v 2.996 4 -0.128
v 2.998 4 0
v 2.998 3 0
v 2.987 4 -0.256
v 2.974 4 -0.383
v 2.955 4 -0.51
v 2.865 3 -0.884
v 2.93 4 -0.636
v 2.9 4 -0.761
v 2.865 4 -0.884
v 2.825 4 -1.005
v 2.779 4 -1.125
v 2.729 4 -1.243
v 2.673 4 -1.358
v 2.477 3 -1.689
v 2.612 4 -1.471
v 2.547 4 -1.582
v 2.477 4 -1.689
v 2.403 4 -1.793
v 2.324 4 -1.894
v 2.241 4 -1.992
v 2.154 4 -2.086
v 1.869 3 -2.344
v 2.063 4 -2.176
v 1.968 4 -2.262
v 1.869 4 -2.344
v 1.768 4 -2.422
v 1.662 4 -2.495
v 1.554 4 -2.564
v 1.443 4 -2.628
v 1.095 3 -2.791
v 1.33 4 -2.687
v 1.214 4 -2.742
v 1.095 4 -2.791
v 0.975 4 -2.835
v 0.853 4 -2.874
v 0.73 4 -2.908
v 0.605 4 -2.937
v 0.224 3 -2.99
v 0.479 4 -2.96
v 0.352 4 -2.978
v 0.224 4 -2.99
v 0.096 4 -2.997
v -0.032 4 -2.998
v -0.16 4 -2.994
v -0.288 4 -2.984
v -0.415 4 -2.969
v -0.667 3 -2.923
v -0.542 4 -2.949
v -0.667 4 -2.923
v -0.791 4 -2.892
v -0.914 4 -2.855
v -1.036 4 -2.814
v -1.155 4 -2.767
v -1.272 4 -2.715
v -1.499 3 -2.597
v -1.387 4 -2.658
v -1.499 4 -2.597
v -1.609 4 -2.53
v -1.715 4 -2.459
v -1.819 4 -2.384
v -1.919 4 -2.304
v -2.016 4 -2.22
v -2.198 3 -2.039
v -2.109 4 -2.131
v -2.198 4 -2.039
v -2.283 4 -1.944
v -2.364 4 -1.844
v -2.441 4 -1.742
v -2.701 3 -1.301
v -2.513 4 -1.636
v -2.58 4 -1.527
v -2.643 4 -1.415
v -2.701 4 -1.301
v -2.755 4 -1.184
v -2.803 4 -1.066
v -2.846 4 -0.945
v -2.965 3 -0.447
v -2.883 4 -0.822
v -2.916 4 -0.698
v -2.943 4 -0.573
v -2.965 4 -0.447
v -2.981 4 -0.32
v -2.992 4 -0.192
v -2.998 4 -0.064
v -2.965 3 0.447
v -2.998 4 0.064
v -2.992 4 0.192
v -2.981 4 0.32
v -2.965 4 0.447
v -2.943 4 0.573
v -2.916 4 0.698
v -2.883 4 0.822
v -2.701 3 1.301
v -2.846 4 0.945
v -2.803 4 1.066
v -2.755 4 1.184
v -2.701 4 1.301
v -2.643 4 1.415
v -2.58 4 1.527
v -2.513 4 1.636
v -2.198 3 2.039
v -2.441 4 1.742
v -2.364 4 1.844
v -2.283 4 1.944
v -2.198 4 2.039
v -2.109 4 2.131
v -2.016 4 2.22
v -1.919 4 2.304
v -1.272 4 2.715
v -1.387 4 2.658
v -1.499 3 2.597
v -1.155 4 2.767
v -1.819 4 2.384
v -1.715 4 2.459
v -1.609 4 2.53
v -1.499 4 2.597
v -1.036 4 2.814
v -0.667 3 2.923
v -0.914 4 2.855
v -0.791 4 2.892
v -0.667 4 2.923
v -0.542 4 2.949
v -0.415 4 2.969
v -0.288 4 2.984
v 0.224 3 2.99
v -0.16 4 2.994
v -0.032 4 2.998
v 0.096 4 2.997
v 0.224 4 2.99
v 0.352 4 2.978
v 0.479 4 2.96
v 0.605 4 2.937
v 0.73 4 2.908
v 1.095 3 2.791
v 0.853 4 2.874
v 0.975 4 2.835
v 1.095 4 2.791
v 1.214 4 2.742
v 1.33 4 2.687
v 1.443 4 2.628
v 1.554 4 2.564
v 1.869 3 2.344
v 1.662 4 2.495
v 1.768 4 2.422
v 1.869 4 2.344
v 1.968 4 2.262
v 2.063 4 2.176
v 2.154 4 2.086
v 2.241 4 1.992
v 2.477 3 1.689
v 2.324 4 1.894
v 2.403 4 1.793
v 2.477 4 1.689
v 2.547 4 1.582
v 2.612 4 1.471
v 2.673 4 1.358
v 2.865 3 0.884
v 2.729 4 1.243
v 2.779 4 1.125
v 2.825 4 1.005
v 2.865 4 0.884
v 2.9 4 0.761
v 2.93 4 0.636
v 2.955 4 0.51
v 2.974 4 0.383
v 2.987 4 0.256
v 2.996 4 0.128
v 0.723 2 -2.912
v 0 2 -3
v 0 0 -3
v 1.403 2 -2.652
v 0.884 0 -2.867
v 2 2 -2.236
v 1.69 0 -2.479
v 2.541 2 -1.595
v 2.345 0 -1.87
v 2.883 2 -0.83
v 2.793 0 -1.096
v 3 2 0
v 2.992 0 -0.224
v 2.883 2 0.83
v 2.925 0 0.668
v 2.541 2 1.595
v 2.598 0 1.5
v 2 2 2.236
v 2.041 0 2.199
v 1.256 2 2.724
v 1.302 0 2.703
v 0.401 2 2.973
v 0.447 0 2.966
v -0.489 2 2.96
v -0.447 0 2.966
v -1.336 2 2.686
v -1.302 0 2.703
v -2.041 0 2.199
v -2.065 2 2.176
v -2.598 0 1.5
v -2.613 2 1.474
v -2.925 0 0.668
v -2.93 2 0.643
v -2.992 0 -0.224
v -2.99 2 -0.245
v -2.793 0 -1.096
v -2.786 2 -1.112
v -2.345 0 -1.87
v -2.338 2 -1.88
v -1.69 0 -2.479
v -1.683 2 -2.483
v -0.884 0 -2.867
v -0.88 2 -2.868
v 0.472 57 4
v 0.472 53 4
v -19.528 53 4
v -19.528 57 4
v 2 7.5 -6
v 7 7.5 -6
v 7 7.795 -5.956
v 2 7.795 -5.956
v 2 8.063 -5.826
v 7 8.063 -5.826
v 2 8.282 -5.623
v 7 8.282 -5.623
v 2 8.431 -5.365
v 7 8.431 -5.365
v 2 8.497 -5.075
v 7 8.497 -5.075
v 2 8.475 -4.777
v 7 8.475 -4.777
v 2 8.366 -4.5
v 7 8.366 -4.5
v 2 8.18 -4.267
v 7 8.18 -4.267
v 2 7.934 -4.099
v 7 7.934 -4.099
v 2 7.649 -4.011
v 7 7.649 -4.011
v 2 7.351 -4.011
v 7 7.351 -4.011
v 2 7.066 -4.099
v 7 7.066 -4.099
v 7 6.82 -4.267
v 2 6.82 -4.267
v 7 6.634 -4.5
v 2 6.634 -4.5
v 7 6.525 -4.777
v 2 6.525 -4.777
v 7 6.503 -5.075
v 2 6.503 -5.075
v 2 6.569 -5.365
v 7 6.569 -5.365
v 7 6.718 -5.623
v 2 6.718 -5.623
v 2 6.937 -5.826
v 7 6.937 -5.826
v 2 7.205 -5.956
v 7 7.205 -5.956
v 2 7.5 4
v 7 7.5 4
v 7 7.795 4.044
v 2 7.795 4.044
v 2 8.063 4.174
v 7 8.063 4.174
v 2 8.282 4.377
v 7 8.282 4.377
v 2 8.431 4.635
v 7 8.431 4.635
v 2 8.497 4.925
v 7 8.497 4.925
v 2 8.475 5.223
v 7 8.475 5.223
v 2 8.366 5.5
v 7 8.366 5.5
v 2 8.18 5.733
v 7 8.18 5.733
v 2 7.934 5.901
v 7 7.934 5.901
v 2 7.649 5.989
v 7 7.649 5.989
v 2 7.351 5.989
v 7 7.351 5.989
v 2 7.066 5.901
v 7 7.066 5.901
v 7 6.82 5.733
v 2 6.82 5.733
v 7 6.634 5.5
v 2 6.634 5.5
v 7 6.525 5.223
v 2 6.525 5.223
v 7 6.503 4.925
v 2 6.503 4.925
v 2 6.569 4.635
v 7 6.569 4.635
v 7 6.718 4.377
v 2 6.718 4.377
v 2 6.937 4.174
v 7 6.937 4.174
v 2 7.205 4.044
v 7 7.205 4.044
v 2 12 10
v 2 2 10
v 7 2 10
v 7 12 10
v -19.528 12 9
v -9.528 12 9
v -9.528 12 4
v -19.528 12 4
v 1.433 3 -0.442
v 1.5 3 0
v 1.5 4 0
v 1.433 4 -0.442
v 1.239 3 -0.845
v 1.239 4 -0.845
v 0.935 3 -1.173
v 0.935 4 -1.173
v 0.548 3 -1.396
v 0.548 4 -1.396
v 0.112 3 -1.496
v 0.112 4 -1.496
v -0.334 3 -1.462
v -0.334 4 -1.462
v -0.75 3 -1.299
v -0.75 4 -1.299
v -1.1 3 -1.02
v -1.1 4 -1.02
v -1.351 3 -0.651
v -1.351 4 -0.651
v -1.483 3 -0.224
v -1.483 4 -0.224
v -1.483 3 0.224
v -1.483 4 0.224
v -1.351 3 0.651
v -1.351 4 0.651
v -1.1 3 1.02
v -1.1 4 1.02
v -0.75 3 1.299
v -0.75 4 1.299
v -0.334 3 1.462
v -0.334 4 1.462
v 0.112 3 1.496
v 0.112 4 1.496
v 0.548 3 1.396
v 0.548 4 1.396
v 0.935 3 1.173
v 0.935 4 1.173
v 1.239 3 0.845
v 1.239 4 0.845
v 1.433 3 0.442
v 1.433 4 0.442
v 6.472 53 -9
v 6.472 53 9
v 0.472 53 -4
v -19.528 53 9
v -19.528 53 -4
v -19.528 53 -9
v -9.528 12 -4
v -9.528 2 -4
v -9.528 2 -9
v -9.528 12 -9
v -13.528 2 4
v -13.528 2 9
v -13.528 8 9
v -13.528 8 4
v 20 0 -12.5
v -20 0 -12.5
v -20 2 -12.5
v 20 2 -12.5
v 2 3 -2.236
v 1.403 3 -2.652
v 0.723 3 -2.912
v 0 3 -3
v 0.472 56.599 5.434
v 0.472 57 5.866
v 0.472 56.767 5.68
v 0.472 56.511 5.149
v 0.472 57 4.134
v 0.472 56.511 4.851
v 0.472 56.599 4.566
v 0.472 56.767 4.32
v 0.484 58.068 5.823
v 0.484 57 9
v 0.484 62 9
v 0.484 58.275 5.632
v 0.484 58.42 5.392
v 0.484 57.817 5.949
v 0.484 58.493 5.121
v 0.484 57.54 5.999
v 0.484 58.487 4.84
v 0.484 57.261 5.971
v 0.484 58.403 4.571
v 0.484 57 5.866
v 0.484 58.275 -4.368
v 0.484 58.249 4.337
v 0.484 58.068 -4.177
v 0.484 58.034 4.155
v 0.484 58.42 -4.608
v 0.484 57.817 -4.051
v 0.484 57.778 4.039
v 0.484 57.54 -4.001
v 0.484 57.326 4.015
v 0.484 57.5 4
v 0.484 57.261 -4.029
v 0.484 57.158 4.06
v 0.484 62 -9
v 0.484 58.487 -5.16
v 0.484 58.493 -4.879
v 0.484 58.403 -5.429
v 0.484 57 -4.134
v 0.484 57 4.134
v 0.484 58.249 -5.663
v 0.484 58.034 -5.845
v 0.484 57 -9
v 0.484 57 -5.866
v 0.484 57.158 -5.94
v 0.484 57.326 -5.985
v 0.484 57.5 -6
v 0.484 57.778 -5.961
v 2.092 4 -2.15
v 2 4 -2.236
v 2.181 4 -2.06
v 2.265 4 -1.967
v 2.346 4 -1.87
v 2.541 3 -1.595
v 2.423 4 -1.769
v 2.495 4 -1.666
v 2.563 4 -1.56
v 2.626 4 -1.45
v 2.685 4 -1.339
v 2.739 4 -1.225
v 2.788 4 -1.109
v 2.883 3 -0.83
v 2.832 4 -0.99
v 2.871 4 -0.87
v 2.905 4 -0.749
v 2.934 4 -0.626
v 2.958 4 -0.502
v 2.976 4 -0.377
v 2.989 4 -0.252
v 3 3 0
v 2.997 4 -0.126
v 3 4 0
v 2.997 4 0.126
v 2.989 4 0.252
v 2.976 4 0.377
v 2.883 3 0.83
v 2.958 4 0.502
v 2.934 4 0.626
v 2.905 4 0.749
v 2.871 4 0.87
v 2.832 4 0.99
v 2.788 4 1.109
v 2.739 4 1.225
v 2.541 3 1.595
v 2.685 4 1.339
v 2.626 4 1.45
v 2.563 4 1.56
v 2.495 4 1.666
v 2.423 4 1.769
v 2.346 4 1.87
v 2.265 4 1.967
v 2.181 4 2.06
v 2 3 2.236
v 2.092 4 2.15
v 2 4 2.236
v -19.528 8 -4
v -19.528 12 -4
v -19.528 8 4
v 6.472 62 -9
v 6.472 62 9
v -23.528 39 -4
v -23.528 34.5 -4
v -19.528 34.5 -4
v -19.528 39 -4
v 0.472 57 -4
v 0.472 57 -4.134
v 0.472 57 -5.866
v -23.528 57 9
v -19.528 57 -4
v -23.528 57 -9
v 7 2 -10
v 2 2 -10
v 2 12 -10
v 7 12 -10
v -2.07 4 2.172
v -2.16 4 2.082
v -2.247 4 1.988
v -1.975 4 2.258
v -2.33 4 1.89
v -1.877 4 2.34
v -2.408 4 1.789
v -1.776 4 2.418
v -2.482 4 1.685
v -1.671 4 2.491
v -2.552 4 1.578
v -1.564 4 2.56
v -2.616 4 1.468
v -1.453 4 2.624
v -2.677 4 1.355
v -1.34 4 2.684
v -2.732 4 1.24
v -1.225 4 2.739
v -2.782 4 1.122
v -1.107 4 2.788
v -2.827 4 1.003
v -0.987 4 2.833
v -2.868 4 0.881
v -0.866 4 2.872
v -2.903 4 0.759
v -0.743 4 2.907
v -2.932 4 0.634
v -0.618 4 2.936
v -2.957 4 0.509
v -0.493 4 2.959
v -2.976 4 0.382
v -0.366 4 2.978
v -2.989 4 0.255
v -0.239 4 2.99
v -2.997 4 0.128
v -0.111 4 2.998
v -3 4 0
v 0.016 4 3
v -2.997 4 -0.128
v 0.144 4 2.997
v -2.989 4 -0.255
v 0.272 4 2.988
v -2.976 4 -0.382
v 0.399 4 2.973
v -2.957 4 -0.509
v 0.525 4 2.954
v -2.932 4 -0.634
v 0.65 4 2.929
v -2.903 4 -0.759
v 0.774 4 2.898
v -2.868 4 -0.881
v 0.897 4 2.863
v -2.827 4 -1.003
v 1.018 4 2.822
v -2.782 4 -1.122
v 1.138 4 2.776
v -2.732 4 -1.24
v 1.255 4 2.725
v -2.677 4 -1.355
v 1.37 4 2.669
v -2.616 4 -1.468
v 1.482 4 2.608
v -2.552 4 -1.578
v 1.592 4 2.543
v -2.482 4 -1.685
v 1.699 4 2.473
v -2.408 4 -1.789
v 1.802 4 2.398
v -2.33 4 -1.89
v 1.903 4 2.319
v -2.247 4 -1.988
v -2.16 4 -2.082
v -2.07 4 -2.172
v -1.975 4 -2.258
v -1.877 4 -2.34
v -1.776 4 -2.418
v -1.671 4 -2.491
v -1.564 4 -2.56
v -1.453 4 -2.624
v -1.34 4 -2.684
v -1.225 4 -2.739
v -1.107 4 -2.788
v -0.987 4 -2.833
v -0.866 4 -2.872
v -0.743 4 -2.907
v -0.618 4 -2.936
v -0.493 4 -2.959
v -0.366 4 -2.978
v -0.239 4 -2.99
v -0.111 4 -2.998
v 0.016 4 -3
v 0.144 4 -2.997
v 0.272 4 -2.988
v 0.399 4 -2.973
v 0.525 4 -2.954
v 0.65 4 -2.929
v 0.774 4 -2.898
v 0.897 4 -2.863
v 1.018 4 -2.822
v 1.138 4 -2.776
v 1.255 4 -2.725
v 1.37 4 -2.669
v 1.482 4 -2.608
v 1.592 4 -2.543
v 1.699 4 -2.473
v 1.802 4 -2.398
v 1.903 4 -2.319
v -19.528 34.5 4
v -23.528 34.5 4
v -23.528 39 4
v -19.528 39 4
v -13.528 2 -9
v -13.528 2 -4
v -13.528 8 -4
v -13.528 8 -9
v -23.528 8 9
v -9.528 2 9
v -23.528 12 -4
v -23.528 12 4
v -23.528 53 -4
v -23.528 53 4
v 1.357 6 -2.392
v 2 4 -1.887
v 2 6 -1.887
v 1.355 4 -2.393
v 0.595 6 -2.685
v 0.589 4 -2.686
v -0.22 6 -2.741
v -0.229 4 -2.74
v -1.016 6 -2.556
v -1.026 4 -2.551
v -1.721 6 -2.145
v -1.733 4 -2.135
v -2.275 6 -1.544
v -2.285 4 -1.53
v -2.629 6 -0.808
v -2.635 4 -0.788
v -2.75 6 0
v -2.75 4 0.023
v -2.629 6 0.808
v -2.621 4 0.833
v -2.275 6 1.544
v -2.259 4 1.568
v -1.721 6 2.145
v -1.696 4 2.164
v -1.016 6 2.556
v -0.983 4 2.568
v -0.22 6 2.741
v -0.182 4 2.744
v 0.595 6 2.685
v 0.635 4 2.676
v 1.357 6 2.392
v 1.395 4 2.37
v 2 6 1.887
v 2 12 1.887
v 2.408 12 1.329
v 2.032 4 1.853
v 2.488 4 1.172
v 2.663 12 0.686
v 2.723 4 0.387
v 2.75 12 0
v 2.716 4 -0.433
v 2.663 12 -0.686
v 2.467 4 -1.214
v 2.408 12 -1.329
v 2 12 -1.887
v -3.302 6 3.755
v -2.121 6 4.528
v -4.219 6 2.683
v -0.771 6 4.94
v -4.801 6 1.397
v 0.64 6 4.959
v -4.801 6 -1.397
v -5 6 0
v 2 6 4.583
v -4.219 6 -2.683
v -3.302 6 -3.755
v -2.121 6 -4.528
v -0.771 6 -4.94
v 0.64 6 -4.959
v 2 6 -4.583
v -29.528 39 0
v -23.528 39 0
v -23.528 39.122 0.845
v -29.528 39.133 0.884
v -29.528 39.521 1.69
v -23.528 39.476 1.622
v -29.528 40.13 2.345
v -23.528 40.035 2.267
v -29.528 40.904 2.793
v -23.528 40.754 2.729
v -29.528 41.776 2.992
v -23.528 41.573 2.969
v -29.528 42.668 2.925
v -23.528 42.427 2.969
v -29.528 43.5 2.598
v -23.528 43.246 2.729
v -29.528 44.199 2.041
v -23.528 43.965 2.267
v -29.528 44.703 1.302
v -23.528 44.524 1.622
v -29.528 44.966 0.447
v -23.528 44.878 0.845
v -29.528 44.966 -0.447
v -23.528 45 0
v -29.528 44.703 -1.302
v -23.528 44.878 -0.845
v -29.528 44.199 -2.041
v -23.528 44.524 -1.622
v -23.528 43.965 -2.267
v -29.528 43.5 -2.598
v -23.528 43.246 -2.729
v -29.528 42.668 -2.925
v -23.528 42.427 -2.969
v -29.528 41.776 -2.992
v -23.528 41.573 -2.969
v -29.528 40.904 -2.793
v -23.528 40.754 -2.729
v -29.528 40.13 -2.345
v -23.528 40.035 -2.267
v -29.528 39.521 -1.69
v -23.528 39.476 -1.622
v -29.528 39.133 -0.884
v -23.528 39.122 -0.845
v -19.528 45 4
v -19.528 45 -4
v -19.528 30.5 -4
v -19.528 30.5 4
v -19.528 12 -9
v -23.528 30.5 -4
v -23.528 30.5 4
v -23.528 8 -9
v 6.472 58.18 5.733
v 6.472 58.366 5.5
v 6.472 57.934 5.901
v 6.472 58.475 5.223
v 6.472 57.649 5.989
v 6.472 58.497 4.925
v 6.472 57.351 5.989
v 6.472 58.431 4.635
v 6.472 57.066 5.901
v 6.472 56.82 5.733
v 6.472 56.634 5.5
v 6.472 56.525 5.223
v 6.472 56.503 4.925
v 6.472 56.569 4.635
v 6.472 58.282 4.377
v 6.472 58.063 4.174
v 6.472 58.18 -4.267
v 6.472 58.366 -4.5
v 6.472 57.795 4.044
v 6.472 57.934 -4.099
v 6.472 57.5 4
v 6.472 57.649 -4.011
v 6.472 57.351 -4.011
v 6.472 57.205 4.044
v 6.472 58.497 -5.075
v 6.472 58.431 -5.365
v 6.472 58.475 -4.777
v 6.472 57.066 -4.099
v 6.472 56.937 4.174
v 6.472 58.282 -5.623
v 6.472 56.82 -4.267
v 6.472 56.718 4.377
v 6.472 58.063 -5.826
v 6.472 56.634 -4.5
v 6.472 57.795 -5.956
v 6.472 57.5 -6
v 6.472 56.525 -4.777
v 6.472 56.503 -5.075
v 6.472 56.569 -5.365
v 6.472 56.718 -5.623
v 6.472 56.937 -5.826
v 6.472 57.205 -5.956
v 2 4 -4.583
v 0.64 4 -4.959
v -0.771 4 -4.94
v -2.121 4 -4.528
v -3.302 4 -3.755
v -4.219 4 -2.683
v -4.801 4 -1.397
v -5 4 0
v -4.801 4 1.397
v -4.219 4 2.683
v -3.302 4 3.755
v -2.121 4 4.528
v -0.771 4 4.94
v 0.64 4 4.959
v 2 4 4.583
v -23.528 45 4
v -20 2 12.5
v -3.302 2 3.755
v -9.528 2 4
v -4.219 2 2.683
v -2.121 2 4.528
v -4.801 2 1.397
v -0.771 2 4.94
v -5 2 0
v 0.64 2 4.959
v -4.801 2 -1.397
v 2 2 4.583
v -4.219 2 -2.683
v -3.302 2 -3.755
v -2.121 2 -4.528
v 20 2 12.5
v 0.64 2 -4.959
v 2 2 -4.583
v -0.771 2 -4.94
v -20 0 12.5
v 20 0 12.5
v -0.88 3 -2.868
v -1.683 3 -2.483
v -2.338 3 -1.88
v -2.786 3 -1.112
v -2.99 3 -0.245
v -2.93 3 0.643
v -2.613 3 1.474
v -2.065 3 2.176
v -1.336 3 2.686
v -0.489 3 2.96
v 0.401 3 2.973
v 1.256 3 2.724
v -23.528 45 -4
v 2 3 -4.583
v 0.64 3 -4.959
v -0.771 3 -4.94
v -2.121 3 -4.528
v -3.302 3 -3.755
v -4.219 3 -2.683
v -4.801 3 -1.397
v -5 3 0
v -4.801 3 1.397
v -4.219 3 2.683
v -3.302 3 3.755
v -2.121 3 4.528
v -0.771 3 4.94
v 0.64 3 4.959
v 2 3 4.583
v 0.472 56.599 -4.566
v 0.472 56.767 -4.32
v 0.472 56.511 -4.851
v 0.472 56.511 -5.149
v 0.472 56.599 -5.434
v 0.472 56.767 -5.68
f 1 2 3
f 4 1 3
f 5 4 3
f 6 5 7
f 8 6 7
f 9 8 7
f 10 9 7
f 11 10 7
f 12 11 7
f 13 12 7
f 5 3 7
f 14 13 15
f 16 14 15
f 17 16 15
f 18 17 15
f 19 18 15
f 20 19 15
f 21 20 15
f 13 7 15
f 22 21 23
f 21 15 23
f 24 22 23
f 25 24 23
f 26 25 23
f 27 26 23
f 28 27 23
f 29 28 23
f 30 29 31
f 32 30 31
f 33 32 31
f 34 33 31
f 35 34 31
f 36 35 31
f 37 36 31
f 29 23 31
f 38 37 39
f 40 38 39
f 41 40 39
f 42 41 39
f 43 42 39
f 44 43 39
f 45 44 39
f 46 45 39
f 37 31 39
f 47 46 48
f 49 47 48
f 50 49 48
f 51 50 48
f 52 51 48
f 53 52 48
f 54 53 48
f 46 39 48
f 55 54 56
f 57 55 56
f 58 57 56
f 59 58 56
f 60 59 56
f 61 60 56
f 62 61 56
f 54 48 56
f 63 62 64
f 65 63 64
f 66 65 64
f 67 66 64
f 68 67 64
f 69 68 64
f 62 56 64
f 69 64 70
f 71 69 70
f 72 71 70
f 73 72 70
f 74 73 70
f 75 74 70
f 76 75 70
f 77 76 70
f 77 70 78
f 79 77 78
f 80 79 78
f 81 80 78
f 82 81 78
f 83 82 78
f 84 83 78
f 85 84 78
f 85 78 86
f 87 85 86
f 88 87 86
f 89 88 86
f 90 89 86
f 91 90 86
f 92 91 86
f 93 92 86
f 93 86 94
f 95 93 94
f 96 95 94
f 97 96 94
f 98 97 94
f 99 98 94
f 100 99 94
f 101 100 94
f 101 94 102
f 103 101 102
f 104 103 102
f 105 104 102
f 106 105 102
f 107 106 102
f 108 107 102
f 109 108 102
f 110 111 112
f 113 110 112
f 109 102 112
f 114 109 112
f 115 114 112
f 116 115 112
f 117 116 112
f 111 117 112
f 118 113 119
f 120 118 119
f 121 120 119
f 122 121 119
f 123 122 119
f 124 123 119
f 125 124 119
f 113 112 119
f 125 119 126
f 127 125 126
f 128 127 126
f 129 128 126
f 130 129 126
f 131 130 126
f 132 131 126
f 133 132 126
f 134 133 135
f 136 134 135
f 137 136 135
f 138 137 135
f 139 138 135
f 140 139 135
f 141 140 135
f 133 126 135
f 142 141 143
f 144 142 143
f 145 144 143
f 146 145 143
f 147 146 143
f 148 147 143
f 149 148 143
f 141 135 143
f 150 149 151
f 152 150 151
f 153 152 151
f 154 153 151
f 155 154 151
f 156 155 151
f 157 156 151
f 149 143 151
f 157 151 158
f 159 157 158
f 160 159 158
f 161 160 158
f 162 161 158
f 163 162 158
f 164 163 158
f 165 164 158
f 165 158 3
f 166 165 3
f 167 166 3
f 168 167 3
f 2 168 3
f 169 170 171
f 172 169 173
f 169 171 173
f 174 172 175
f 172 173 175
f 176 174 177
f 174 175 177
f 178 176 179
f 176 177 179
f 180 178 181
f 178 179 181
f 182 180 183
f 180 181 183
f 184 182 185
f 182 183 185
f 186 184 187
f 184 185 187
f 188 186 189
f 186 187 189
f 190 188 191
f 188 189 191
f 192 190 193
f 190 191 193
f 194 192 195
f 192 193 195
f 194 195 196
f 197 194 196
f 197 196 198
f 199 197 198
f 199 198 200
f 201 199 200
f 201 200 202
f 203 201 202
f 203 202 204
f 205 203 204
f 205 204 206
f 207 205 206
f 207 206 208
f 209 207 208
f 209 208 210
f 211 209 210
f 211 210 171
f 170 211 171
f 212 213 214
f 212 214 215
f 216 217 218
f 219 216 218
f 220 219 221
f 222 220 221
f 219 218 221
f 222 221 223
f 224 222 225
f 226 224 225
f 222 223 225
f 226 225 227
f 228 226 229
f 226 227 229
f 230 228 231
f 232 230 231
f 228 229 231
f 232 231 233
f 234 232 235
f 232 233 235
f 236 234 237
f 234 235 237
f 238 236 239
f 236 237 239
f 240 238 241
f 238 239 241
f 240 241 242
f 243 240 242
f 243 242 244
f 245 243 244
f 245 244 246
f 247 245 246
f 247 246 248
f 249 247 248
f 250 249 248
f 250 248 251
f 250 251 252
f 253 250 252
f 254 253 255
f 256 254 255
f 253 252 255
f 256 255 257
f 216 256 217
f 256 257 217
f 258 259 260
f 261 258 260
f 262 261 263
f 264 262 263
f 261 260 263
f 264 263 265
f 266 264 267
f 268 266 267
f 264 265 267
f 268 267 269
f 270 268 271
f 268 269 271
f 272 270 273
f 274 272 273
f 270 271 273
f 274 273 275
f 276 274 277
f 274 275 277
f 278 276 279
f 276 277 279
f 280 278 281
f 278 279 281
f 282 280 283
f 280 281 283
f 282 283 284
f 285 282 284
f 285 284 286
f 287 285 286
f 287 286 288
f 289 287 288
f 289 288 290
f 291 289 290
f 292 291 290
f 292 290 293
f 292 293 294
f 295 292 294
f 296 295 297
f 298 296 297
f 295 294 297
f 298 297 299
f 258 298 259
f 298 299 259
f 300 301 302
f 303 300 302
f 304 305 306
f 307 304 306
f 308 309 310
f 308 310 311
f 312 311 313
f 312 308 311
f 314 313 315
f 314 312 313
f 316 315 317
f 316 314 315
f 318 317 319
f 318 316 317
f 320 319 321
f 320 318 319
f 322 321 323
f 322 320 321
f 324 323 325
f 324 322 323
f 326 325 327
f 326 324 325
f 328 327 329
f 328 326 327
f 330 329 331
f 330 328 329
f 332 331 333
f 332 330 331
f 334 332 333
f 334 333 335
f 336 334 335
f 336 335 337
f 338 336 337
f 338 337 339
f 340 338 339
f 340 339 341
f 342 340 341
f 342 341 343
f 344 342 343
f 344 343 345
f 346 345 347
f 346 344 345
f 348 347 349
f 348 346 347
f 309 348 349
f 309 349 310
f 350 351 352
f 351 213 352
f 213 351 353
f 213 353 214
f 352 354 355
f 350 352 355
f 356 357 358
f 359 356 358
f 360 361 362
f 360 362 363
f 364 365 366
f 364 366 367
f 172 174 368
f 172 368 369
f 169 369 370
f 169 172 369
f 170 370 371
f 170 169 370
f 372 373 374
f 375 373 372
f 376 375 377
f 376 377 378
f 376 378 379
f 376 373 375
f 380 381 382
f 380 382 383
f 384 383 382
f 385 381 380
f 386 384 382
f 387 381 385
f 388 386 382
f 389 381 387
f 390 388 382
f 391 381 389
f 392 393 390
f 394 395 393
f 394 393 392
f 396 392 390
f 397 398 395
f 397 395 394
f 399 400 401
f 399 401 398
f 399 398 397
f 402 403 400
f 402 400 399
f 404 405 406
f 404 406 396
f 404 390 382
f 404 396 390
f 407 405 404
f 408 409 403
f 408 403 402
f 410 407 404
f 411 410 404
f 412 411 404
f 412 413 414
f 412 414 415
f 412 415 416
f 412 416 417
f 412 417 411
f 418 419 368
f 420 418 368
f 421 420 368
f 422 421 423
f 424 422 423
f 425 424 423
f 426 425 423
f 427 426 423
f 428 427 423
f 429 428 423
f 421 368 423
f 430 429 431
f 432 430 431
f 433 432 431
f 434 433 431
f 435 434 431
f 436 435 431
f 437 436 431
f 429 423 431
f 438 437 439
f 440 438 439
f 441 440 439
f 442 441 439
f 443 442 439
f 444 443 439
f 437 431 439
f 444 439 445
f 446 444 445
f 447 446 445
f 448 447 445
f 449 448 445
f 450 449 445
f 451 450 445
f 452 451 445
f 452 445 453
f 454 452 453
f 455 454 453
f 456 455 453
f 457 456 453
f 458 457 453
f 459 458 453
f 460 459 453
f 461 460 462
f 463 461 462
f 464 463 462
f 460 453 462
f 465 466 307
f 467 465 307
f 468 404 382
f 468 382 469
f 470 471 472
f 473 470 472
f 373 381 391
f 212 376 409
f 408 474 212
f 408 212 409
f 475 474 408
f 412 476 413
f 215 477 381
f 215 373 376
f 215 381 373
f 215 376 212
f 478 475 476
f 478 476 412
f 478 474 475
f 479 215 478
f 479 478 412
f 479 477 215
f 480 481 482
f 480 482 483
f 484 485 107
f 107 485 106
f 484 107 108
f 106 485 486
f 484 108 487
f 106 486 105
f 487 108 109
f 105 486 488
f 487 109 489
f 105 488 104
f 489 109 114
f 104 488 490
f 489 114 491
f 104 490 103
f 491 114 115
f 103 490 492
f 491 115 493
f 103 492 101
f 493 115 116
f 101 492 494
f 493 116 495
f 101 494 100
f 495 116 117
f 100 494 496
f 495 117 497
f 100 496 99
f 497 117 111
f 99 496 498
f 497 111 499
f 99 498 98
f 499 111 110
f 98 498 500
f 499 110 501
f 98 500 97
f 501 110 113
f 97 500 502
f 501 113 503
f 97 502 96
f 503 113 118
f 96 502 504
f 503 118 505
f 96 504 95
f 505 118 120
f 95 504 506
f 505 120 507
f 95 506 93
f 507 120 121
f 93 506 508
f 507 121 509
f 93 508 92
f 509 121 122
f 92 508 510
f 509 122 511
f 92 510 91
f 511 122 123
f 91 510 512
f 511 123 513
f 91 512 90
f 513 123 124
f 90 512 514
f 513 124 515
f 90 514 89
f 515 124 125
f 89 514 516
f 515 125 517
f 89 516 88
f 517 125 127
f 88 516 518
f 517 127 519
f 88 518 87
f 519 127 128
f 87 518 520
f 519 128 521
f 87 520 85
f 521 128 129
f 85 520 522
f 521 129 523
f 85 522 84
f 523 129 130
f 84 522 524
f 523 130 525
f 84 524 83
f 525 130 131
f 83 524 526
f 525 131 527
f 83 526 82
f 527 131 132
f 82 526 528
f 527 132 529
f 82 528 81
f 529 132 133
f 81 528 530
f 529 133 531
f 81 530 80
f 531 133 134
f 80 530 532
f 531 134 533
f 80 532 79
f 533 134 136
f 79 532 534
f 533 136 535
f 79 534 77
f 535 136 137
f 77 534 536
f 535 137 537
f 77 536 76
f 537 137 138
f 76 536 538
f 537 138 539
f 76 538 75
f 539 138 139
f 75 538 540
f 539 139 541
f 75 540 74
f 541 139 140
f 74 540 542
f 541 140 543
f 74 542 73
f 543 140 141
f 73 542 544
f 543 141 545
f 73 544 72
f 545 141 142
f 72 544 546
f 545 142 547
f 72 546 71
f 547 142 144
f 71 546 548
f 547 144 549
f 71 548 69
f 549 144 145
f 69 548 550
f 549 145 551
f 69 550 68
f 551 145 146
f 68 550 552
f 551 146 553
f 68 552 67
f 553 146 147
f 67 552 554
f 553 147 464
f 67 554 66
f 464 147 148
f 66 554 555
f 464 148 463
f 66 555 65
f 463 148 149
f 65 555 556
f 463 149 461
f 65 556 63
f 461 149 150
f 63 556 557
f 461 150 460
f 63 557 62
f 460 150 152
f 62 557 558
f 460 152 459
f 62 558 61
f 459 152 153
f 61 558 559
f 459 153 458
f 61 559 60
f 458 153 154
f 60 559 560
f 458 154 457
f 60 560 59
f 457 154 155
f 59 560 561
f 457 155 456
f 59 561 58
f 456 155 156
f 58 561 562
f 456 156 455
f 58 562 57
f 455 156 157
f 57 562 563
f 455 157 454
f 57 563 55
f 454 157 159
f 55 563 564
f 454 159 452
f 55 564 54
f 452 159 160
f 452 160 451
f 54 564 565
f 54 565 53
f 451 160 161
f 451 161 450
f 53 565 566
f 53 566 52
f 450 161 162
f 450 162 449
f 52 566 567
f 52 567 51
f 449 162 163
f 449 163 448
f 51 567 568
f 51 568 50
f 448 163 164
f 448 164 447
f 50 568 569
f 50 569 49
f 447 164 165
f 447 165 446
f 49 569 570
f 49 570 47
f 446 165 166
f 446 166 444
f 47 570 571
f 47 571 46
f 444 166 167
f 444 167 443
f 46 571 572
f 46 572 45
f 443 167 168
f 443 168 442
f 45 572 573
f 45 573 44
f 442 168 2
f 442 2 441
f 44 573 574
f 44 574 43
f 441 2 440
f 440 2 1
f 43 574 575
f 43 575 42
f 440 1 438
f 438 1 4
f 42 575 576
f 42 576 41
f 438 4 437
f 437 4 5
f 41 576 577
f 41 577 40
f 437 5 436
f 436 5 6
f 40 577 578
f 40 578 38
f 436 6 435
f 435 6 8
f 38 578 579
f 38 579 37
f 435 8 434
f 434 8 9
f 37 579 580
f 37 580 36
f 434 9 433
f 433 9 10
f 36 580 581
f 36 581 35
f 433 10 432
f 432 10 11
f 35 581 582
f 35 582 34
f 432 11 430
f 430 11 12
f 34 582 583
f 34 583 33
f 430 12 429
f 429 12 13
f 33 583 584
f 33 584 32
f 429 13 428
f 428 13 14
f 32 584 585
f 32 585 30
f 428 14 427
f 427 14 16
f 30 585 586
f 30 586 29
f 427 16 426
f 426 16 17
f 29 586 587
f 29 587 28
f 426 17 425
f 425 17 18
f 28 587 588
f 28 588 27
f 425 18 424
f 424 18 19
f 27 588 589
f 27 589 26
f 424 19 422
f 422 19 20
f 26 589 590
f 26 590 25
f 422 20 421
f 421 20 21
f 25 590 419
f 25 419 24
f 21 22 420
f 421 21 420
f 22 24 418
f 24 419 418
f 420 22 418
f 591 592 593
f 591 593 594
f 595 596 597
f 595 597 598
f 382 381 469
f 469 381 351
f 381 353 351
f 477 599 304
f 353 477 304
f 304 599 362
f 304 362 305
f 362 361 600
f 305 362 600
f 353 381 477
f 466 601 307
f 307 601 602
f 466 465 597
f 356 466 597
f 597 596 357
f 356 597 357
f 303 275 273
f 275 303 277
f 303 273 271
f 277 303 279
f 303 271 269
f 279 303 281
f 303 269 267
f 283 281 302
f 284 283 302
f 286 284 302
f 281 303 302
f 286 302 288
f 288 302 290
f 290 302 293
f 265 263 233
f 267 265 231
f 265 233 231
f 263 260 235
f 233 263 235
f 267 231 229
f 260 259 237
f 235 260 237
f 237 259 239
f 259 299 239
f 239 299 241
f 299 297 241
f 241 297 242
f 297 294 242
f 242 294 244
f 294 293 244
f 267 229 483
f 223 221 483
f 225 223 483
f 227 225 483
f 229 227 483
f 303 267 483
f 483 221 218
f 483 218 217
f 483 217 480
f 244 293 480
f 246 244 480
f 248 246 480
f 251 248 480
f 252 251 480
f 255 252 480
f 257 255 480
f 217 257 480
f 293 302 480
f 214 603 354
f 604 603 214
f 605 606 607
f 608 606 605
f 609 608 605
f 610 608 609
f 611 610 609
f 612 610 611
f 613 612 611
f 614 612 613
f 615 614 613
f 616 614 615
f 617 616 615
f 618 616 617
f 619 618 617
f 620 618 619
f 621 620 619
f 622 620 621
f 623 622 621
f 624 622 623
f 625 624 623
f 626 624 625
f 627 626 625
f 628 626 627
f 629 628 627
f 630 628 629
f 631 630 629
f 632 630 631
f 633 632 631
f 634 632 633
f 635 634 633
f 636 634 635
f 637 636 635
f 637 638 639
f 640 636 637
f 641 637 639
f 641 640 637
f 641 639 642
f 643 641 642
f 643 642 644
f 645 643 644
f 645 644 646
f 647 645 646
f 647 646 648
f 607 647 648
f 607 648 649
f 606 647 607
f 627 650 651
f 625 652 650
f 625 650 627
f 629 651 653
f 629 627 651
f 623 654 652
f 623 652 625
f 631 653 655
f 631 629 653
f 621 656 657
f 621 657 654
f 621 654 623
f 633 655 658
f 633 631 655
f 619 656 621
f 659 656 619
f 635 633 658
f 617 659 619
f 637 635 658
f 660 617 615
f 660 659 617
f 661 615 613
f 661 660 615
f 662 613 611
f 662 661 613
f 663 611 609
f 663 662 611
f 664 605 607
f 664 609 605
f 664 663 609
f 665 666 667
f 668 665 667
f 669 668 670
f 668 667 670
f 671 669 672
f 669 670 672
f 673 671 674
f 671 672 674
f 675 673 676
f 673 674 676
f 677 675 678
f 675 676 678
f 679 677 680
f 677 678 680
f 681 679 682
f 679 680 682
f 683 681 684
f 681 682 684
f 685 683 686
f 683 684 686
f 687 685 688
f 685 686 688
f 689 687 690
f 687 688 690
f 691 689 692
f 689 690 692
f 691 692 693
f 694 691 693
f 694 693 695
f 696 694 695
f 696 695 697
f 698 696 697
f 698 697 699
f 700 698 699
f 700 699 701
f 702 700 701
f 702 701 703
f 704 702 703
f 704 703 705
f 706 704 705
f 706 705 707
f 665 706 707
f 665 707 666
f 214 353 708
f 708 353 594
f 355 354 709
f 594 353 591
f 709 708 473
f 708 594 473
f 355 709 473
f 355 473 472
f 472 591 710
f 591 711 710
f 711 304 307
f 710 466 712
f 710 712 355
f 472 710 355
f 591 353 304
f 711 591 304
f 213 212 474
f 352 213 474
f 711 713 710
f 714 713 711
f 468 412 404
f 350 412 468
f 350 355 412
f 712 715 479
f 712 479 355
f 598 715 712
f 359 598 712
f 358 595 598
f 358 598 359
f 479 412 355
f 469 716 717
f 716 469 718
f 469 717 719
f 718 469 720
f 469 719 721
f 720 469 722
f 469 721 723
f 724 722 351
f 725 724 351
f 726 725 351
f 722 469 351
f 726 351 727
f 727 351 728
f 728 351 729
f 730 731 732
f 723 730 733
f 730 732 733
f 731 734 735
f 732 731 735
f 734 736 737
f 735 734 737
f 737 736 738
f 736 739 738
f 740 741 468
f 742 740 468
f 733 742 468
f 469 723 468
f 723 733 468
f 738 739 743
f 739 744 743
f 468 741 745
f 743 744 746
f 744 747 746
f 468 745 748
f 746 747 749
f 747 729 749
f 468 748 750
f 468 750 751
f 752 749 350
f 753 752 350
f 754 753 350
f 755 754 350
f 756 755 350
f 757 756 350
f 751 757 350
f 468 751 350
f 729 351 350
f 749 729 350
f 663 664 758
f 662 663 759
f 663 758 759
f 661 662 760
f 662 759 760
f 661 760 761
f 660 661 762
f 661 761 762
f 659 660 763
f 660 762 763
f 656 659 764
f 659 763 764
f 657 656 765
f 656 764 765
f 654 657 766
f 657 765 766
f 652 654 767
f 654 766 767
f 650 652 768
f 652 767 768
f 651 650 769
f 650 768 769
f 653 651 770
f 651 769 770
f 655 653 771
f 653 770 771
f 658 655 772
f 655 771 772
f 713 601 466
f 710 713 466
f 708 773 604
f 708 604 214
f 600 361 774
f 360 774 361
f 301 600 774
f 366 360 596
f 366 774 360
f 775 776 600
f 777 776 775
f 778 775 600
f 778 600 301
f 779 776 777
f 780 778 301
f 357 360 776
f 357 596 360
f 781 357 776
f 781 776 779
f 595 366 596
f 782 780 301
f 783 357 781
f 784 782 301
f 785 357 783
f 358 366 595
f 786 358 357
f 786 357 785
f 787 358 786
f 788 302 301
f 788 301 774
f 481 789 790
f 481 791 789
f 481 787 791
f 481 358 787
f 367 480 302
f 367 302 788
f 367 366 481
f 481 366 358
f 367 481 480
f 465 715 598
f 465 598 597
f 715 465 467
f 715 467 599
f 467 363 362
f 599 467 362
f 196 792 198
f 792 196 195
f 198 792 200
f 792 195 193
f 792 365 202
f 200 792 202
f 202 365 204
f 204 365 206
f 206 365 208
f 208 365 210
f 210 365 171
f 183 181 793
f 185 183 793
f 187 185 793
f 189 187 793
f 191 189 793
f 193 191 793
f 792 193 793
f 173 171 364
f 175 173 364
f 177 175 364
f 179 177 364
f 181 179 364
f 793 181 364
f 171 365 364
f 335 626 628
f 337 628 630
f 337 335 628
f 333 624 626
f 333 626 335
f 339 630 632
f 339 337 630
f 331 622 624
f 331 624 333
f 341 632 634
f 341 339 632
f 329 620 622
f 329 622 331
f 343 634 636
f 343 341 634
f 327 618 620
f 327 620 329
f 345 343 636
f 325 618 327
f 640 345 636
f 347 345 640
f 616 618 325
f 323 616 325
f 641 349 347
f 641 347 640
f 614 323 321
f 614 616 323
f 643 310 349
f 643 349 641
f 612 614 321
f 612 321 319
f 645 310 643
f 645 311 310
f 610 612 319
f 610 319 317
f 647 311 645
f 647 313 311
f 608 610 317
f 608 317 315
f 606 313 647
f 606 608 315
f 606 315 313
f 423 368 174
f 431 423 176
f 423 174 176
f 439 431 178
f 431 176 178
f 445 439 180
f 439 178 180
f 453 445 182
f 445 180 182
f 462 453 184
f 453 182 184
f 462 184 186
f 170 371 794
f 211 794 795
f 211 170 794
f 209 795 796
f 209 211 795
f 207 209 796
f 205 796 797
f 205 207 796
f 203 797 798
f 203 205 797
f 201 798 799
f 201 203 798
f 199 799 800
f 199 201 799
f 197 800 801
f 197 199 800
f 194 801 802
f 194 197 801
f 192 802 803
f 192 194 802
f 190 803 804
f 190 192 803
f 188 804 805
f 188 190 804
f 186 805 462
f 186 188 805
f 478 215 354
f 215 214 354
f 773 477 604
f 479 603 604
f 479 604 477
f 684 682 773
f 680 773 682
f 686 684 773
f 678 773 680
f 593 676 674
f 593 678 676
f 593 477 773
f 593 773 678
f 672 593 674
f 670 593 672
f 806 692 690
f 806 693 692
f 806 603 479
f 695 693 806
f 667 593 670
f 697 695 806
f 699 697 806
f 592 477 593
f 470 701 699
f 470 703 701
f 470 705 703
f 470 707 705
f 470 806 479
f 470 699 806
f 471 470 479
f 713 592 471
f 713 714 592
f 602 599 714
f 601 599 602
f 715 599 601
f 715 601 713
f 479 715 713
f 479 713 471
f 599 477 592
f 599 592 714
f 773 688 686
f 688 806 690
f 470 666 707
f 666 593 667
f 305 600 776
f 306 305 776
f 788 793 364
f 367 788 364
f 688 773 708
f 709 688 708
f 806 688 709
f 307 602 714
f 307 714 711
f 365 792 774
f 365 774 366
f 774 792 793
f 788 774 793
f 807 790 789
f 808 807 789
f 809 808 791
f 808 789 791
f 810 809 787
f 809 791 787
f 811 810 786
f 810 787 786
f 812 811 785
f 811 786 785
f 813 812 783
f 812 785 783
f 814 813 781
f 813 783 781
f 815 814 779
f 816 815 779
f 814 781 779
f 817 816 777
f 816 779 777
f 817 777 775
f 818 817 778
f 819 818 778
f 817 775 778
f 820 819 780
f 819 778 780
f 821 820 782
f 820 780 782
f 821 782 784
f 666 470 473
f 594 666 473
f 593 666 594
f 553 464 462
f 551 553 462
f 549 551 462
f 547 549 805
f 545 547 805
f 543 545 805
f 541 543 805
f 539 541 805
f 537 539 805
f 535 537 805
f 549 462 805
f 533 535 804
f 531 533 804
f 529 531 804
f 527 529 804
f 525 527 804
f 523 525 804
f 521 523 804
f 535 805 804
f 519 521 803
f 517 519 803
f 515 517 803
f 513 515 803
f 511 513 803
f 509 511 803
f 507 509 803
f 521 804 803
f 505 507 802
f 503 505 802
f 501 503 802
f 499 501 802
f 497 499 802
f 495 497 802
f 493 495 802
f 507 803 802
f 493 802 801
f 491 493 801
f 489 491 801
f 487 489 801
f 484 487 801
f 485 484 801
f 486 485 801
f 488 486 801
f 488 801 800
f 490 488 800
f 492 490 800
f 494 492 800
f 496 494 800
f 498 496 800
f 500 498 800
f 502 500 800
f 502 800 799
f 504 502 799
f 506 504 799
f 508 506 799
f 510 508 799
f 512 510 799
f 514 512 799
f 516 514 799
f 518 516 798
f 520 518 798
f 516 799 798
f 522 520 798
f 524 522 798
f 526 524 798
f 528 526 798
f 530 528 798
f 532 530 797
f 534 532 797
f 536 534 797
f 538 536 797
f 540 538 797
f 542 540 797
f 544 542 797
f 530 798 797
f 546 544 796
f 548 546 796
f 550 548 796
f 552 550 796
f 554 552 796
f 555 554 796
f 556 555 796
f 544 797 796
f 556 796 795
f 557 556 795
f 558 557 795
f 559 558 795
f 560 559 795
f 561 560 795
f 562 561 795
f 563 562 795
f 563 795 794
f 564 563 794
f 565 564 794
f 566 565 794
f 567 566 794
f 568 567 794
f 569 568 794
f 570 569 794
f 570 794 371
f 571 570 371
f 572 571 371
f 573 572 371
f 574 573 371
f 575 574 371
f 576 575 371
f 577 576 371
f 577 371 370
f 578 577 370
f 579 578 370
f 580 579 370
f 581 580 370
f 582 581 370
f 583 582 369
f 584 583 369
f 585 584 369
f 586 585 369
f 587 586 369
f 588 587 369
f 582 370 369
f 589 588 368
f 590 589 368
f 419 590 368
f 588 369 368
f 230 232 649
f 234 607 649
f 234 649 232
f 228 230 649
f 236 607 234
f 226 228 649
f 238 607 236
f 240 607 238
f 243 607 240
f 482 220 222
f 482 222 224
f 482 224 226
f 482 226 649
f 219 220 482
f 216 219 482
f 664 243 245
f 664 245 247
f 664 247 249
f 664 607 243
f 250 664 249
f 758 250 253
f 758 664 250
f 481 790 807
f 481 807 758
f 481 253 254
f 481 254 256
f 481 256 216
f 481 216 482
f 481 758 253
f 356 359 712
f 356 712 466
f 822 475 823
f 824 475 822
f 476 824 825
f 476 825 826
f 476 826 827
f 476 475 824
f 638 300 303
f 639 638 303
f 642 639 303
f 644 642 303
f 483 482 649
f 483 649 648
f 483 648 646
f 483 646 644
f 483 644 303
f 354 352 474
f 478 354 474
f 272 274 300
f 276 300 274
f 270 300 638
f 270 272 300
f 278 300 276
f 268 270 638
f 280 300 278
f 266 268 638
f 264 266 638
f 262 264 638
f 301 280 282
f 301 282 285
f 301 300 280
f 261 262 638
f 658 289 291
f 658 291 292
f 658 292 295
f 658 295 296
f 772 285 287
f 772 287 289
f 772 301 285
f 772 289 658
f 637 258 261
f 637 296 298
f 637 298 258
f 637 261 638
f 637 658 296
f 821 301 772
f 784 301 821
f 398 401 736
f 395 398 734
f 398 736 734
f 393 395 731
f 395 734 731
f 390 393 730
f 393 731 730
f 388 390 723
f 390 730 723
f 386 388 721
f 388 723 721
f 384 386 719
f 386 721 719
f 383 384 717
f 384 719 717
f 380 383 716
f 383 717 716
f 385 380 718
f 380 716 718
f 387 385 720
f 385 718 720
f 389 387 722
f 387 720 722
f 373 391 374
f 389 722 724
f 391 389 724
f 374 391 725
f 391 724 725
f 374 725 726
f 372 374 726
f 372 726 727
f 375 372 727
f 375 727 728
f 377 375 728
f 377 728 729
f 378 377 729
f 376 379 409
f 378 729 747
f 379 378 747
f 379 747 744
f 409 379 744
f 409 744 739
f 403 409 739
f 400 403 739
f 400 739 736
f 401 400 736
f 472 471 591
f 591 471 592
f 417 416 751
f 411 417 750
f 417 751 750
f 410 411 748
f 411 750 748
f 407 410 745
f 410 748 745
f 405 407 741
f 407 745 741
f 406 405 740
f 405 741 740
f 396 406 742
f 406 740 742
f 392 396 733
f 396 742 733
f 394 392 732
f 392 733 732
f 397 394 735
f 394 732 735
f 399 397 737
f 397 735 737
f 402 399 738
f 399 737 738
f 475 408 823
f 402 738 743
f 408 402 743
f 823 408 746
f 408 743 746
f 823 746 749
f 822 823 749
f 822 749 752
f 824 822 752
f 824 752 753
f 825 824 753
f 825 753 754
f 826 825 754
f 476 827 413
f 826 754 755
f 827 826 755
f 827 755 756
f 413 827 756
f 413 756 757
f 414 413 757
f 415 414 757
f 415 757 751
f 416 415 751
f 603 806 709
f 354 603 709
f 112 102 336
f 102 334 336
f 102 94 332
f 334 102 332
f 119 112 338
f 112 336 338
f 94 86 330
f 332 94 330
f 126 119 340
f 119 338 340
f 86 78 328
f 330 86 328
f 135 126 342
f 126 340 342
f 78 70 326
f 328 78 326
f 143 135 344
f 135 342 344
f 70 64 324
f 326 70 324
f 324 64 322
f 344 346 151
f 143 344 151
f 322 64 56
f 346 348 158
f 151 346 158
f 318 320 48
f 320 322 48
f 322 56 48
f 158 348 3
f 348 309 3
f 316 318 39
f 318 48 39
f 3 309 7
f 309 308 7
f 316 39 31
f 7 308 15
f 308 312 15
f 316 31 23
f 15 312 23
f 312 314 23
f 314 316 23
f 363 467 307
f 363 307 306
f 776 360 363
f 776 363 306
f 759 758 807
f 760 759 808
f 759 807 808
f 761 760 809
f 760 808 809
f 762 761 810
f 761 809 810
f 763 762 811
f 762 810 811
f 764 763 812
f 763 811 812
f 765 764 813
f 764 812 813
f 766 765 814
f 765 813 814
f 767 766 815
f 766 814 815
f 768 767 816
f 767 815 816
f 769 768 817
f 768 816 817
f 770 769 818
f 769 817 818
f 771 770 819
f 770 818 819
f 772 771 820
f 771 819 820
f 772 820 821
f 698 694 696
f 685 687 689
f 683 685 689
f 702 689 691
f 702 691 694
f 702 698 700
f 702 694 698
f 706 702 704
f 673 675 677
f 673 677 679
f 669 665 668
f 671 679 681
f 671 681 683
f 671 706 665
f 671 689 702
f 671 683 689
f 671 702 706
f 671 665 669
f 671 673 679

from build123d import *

# Parameters (mm, degrees)
SKETCH1_W                  = 40
SKETCH1_H                  = 25
BOSS_EXTRUDE1_DEPTH        = 2
SKETCH2_W                  = 5
SKETCH2_H                  = 20
BOSS_EXTRUDE2_DEPTH        = 10
SKETCH4_W                  = 19.965035534
SKETCH4_H                  = 6
BOSS_EXTRUDE3_DEPTH        = 5
SKETCH5_R                  = 1
CUT_EXTRUDE2_DEPTH         = 5
SKETCH6_W                  = 4
SKETCH6_H                  = 5
BOSS_EXTRUDE4_DEPTH        = 10
SKETCH8_W                  = 5
SKETCH8_H                  = 4
BOSS_EXTRUDE5_DEPTH        = 10
SKETCH9_W                  = 4
SKETCH9_H                  = 5
BOSS_EXTRUDE6_DEPTH        = 45
SKETCH12_W                 = 18
SKETCH12_H                 = 4
BOSS_EXTRUDE8_DEPTH        = 4
SKETCH13_W                 = 5
SKETCH13_H                 = 4
BOSS_EXTRUDE9_DEPTH        = 26
SKETCH14_W                 = 18
SKETCH14_H                 = 4
BOSS_EXTRUDE10_DEPTH       = 6
SKETCH16_W                 = 5.988277512
SKETCH16_H                 = 18
BOSS_EXTRUDE11_DEPTH       = 5
SKETCH15_R                 = 1
CUT_EXTRUDE3_DEPTH         = 6
SKETCH17_R                 = 3
CUT_EXTRUDE5_DEPTH         = 6
SKETCH24_R                 = 3
BOSS_EXTRUDE18_DEPTH       = 4
SKETCH24_4_R               = 3
BOSS_EXTRUDE19_DEPTH       = 6
BOSS_EXTRUDE20_START       = -1
SKETCH20_R                 = 5
SKETCH20_R_2               = 3
BOSS_EXTRUDE20_DEPTH       = 1
BOSS_EXTRUDE21_OUTLINE_R   = 2.998308623
BOSS_EXTRUDE21_OUTLINE_R_2 = 1.5
BOSS_EXTRUDE21_DEPTH       = 1
SKETCH27_R                 = 5
SKETCH27_R_2               = 2.75
BOSS_EXTRUDE22_DEPTH       = 2
SKETCH28_R                 = 2.75
CUT_EXTRUDE10_DEPTH        = 10


# Read off the part's stored shape, not the designer's step: Boss-Extrude21
with BuildPart() as part:
    # Sketch1 → Boss-Extrude1 (new body)
    with BuildSketch(Plane(origin=(0, 0, 0), x_dir=(1, 0, 0), z_dir=(0, 1, 0))):
        Rectangle(SKETCH1_W, SKETCH1_H)
    extrude(amount=BOSS_EXTRUDE1_DEPTH)

    # Sketch2 → Boss-Extrude2 (add)
    with BuildSketch(Plane(origin=(0, 2, 0), x_dir=(1, 0, 0), z_dir=(0, 1, 0))):
        with Locations((4.5, 0)):
            Rectangle(SKETCH2_W, SKETCH2_H)
    extrude(amount=BOSS_EXTRUDE2_DEPTH)

    # Sketch4 → Boss-Extrude3 (add)
    with BuildSketch(Plane(origin=(7, 0, 0), x_dir=(0, 0, -1), z_dir=(1, 0, 0))):
        with Locations((-0.017482233, 9)):
            Rectangle(SKETCH4_W, SKETCH4_H)
    extrude(amount=-BOSS_EXTRUDE3_DEPTH)

    # Sketch5 → Cut-Extrude2 (cut)
    with BuildSketch(Plane(origin=(7, 0, 0), x_dir=(0, 0, -1), z_dir=(1, 0, 0))):
        with Locations((5, 7.5)):
            Circle(SKETCH5_R)
        with Locations((-5, 7.5)):
            Circle(SKETCH5_R)
    extrude(amount=-CUT_EXTRUDE2_DEPTH, mode=Mode.SUBTRACT)

    # Sketch6 → Boss-Extrude4 (add)
    with BuildSketch(Plane(origin=(0, 2, 0), x_dir=(1, 0, 0), z_dir=(0, 1, 0))):
        with Locations((-11.527661753, -6.5)):
            Rectangle(SKETCH6_W, SKETCH6_H)
        with Locations((-11.527661753, 6.5)):
            Rectangle(SKETCH6_W, SKETCH6_H)
    extrude(amount=BOSS_EXTRUDE4_DEPTH)

    # Sketch8 → Boss-Extrude5 (add)
    with BuildSketch(Plane.ZY.offset(13.527661753)):
        with Locations((-6.5, 10)):
            Rectangle(SKETCH8_W, SKETCH8_H)
    boss_extrude5 = extrude(amount=BOSS_EXTRUDE5_DEPTH)

    # Mirror1: Boss-Extrude5 across plane
    add(boss_extrude5.mirror(Plane(origin=(0, 0, 0), x_dir=(1, 0, 0), z_dir=(0, 0, -1))))

    # Sketch9 → Boss-Extrude6 (add)
    with BuildSketch(Plane(origin=(0, 12, 0), x_dir=(1, 0, 0), z_dir=(0, 1, 0))):
        with Locations((-21.527661753, 6.5)):
            Rectangle(SKETCH9_W, SKETCH9_H)
    boss_extrude6 = extrude(amount=BOSS_EXTRUDE6_DEPTH)

    # Mirror2: Boss-Extrude5 across plane
    add(boss_extrude5.mirror(Plane(origin=(0, 0, 0), x_dir=(1, 0, 0), z_dir=(0, 0, -1))))

    # Mirror3: Boss-Extrude6 across plane
    add(boss_extrude6.mirror(Plane(origin=(0, 0, 0), x_dir=(1, 0, 0), z_dir=(0, 0, -1))))

    # Sketch12 → Boss-Extrude8 (add)
    with BuildSketch(Plane.ZY.offset(23.527661753)):
        with Locations((0, 55)):
            Rectangle(SKETCH12_W, SKETCH12_H)
        with Locations((0, 10)):
            Rectangle(SKETCH12_W, SKETCH12_H)
        with Locations((0, 32.5)):
            Rectangle(SKETCH12_W, SKETCH12_H)
    extrude(amount=-BOSS_EXTRUDE8_DEPTH)

    # Sketch13 → Boss-Extrude9 (add)
    with BuildSketch(Plane(origin=(-19.527661753, 0, 0), x_dir=(0, 0, -1), z_dir=(1, 0, 0))):
        with Locations((-6.5, 55)):
            Rectangle(SKETCH13_W, SKETCH13_H)
        with Locations((6.5, 55)):
            Rectangle(SKETCH13_W, SKETCH13_H)
    extrude(amount=BOSS_EXTRUDE9_DEPTH)

    # Sketch14 → Boss-Extrude10 (add)
    with BuildSketch(Plane(origin=(6.472338247, 0, 0), x_dir=(0, 0, -1), z_dir=(1, 0, 0))):
        with Locations((0, 55)):
            Rectangle(SKETCH14_W, SKETCH14_H)
    extrude(amount=-BOSS_EXTRUDE10_DEPTH)

    # Sketch16 → Boss-Extrude11 (add)
    with BuildSketch(Plane(origin=(0, 57, 0), x_dir=(1, 0, 0), z_dir=(0, 1, 0))):
        with Locations((3.478199491, 0)):
            Rectangle(SKETCH16_W, SKETCH16_H)
    extrude(amount=BOSS_EXTRUDE11_DEPTH)

    # Sketch15 → Cut-Extrude3 (cut)
    with BuildSketch(Plane(origin=(6.472338247, 0, 0), x_dir=(0, 0, -1), z_dir=(1, 0, 0))):
        with Locations((-5, 57.5)):
            Circle(SKETCH15_R)
        with Locations((5, 57.5)):
            Circle(SKETCH15_R)
    extrude(amount=-CUT_EXTRUDE3_DEPTH, mode=Mode.SUBTRACT)

    # Sketch17 → Cut-Extrude5 (cut)
    with BuildSketch(Plane.XZ):
        with Locations(Location((0, 0, 0), (0, 0, 270))):
            Circle(SKETCH17_R)
    extrude(amount=-CUT_EXTRUDE5_DEPTH, mode=Mode.SUBTRACT)

    # Sketch24 → Boss-Extrude18 (add)
    with BuildSketch(Plane.ZY.offset(23.527661753)):
        with Locations((0, 42)):
            Circle(SKETCH24_R)
        with BuildLine():
            Line((-4, 45), (-4, 39))
            Line((-4, 39), (0, 39))
            ThreePointArc((0, 39), (-3, 42.000000012), (2.4e-08, 45))
            Line((2.4e-08, 45), (-4, 45))
        make_face()
        with BuildLine():
            ThreePointArc((3, 42), (2.121320344, 39.878679656), (0, 39))
            Line((0, 39), (4, 39))
            Line((4, 39), (4, 45))
            Line((4, 45), (2.4e-08, 45))
            ThreePointArc((2.4e-08, 45), (2.121320352, 44.121320335), (3, 42))
        make_face()
    extrude(amount=-BOSS_EXTRUDE18_DEPTH)

    # Sketch24<4> → Boss-Extrude19 (add)
    with BuildSketch(Plane.ZY.offset(23.527661753)):
        with Locations(Location((0, 42, 0), (0, 0, 270))):
            Circle(SKETCH24_4_R)
    extrude(amount=BOSS_EXTRUDE19_DEPTH)

    # Sketch20 → Boss-Extrude20 (add)
    with BuildSketch(Plane(origin=(0, 3, 0), x_dir=(1, 0, 0), z_dir=(0, 1, 0)).offset(BOSS_EXTRUDE20_START)):
        Circle(SKETCH20_R)
        with Locations(Location((0, 0, 0), (0, 0, 90))):
            Circle(SKETCH20_R_2, mode=Mode.SUBTRACT)
    extrude(amount=BOSS_EXTRUDE20_DEPTH)

    # Boss-Extrude21 outline → Boss-Extrude21 (add)
    # profile 1 of 2: a face of its own
    with BuildSketch(Plane(origin=(0, 3, 0), x_dir=(1, 0, 0), z_dir=(0, 1, 0))):
        with BuildLine():
            ThreePointArc((2, -2.236067977), (-3, 0), (2, 2.236067977))
            Line((2, 2.236067977), (2, 4.582575695))
            ThreePointArc((2, 4.582575695), (-5, 0), (2, -4.582575695))
            Line((2, -4.582575695), (2, -2.236067977))
        make_face()
    # profile 2 of 2: a face of its own
    with BuildSketch(Plane(origin=(0, 3, 0), x_dir=(1, 0, 0), z_dir=(0, 1, 0))):
        Circle(BOSS_EXTRUDE21_OUTLINE_R)
        Circle(BOSS_EXTRUDE21_OUTLINE_R_2, mode=Mode.SUBTRACT)
    extrude(amount=BOSS_EXTRUDE21_DEPTH)

    # Sketch27 → Boss-Extrude22 (add)
    with BuildSketch(Plane(origin=(0, 4, 0), x_dir=(1, 0, 0), z_dir=(0, 1, 0))):
        Circle(SKETCH27_R)
        with Locations(Location((0, 0, 0), (0, 0, 43.341758227))):
            Circle(SKETCH27_R_2, mode=Mode.SUBTRACT)
    extrude(amount=BOSS_EXTRUDE22_DEPTH)

    # Sketch28 → Cut-Extrude10 (cut)
    with BuildSketch(Plane(origin=(0, 6, 0), x_dir=(1, 0, 0), z_dir=(0, 1, 0))):
        with Locations(Location((0, 0, 0), (0, 0, 43.341758227))):
            Circle(SKETCH28_R)
    extrude(amount=CUT_EXTRUDE10_DEPTH, mode=Mode.SUBTRACT)


solid = part.part
